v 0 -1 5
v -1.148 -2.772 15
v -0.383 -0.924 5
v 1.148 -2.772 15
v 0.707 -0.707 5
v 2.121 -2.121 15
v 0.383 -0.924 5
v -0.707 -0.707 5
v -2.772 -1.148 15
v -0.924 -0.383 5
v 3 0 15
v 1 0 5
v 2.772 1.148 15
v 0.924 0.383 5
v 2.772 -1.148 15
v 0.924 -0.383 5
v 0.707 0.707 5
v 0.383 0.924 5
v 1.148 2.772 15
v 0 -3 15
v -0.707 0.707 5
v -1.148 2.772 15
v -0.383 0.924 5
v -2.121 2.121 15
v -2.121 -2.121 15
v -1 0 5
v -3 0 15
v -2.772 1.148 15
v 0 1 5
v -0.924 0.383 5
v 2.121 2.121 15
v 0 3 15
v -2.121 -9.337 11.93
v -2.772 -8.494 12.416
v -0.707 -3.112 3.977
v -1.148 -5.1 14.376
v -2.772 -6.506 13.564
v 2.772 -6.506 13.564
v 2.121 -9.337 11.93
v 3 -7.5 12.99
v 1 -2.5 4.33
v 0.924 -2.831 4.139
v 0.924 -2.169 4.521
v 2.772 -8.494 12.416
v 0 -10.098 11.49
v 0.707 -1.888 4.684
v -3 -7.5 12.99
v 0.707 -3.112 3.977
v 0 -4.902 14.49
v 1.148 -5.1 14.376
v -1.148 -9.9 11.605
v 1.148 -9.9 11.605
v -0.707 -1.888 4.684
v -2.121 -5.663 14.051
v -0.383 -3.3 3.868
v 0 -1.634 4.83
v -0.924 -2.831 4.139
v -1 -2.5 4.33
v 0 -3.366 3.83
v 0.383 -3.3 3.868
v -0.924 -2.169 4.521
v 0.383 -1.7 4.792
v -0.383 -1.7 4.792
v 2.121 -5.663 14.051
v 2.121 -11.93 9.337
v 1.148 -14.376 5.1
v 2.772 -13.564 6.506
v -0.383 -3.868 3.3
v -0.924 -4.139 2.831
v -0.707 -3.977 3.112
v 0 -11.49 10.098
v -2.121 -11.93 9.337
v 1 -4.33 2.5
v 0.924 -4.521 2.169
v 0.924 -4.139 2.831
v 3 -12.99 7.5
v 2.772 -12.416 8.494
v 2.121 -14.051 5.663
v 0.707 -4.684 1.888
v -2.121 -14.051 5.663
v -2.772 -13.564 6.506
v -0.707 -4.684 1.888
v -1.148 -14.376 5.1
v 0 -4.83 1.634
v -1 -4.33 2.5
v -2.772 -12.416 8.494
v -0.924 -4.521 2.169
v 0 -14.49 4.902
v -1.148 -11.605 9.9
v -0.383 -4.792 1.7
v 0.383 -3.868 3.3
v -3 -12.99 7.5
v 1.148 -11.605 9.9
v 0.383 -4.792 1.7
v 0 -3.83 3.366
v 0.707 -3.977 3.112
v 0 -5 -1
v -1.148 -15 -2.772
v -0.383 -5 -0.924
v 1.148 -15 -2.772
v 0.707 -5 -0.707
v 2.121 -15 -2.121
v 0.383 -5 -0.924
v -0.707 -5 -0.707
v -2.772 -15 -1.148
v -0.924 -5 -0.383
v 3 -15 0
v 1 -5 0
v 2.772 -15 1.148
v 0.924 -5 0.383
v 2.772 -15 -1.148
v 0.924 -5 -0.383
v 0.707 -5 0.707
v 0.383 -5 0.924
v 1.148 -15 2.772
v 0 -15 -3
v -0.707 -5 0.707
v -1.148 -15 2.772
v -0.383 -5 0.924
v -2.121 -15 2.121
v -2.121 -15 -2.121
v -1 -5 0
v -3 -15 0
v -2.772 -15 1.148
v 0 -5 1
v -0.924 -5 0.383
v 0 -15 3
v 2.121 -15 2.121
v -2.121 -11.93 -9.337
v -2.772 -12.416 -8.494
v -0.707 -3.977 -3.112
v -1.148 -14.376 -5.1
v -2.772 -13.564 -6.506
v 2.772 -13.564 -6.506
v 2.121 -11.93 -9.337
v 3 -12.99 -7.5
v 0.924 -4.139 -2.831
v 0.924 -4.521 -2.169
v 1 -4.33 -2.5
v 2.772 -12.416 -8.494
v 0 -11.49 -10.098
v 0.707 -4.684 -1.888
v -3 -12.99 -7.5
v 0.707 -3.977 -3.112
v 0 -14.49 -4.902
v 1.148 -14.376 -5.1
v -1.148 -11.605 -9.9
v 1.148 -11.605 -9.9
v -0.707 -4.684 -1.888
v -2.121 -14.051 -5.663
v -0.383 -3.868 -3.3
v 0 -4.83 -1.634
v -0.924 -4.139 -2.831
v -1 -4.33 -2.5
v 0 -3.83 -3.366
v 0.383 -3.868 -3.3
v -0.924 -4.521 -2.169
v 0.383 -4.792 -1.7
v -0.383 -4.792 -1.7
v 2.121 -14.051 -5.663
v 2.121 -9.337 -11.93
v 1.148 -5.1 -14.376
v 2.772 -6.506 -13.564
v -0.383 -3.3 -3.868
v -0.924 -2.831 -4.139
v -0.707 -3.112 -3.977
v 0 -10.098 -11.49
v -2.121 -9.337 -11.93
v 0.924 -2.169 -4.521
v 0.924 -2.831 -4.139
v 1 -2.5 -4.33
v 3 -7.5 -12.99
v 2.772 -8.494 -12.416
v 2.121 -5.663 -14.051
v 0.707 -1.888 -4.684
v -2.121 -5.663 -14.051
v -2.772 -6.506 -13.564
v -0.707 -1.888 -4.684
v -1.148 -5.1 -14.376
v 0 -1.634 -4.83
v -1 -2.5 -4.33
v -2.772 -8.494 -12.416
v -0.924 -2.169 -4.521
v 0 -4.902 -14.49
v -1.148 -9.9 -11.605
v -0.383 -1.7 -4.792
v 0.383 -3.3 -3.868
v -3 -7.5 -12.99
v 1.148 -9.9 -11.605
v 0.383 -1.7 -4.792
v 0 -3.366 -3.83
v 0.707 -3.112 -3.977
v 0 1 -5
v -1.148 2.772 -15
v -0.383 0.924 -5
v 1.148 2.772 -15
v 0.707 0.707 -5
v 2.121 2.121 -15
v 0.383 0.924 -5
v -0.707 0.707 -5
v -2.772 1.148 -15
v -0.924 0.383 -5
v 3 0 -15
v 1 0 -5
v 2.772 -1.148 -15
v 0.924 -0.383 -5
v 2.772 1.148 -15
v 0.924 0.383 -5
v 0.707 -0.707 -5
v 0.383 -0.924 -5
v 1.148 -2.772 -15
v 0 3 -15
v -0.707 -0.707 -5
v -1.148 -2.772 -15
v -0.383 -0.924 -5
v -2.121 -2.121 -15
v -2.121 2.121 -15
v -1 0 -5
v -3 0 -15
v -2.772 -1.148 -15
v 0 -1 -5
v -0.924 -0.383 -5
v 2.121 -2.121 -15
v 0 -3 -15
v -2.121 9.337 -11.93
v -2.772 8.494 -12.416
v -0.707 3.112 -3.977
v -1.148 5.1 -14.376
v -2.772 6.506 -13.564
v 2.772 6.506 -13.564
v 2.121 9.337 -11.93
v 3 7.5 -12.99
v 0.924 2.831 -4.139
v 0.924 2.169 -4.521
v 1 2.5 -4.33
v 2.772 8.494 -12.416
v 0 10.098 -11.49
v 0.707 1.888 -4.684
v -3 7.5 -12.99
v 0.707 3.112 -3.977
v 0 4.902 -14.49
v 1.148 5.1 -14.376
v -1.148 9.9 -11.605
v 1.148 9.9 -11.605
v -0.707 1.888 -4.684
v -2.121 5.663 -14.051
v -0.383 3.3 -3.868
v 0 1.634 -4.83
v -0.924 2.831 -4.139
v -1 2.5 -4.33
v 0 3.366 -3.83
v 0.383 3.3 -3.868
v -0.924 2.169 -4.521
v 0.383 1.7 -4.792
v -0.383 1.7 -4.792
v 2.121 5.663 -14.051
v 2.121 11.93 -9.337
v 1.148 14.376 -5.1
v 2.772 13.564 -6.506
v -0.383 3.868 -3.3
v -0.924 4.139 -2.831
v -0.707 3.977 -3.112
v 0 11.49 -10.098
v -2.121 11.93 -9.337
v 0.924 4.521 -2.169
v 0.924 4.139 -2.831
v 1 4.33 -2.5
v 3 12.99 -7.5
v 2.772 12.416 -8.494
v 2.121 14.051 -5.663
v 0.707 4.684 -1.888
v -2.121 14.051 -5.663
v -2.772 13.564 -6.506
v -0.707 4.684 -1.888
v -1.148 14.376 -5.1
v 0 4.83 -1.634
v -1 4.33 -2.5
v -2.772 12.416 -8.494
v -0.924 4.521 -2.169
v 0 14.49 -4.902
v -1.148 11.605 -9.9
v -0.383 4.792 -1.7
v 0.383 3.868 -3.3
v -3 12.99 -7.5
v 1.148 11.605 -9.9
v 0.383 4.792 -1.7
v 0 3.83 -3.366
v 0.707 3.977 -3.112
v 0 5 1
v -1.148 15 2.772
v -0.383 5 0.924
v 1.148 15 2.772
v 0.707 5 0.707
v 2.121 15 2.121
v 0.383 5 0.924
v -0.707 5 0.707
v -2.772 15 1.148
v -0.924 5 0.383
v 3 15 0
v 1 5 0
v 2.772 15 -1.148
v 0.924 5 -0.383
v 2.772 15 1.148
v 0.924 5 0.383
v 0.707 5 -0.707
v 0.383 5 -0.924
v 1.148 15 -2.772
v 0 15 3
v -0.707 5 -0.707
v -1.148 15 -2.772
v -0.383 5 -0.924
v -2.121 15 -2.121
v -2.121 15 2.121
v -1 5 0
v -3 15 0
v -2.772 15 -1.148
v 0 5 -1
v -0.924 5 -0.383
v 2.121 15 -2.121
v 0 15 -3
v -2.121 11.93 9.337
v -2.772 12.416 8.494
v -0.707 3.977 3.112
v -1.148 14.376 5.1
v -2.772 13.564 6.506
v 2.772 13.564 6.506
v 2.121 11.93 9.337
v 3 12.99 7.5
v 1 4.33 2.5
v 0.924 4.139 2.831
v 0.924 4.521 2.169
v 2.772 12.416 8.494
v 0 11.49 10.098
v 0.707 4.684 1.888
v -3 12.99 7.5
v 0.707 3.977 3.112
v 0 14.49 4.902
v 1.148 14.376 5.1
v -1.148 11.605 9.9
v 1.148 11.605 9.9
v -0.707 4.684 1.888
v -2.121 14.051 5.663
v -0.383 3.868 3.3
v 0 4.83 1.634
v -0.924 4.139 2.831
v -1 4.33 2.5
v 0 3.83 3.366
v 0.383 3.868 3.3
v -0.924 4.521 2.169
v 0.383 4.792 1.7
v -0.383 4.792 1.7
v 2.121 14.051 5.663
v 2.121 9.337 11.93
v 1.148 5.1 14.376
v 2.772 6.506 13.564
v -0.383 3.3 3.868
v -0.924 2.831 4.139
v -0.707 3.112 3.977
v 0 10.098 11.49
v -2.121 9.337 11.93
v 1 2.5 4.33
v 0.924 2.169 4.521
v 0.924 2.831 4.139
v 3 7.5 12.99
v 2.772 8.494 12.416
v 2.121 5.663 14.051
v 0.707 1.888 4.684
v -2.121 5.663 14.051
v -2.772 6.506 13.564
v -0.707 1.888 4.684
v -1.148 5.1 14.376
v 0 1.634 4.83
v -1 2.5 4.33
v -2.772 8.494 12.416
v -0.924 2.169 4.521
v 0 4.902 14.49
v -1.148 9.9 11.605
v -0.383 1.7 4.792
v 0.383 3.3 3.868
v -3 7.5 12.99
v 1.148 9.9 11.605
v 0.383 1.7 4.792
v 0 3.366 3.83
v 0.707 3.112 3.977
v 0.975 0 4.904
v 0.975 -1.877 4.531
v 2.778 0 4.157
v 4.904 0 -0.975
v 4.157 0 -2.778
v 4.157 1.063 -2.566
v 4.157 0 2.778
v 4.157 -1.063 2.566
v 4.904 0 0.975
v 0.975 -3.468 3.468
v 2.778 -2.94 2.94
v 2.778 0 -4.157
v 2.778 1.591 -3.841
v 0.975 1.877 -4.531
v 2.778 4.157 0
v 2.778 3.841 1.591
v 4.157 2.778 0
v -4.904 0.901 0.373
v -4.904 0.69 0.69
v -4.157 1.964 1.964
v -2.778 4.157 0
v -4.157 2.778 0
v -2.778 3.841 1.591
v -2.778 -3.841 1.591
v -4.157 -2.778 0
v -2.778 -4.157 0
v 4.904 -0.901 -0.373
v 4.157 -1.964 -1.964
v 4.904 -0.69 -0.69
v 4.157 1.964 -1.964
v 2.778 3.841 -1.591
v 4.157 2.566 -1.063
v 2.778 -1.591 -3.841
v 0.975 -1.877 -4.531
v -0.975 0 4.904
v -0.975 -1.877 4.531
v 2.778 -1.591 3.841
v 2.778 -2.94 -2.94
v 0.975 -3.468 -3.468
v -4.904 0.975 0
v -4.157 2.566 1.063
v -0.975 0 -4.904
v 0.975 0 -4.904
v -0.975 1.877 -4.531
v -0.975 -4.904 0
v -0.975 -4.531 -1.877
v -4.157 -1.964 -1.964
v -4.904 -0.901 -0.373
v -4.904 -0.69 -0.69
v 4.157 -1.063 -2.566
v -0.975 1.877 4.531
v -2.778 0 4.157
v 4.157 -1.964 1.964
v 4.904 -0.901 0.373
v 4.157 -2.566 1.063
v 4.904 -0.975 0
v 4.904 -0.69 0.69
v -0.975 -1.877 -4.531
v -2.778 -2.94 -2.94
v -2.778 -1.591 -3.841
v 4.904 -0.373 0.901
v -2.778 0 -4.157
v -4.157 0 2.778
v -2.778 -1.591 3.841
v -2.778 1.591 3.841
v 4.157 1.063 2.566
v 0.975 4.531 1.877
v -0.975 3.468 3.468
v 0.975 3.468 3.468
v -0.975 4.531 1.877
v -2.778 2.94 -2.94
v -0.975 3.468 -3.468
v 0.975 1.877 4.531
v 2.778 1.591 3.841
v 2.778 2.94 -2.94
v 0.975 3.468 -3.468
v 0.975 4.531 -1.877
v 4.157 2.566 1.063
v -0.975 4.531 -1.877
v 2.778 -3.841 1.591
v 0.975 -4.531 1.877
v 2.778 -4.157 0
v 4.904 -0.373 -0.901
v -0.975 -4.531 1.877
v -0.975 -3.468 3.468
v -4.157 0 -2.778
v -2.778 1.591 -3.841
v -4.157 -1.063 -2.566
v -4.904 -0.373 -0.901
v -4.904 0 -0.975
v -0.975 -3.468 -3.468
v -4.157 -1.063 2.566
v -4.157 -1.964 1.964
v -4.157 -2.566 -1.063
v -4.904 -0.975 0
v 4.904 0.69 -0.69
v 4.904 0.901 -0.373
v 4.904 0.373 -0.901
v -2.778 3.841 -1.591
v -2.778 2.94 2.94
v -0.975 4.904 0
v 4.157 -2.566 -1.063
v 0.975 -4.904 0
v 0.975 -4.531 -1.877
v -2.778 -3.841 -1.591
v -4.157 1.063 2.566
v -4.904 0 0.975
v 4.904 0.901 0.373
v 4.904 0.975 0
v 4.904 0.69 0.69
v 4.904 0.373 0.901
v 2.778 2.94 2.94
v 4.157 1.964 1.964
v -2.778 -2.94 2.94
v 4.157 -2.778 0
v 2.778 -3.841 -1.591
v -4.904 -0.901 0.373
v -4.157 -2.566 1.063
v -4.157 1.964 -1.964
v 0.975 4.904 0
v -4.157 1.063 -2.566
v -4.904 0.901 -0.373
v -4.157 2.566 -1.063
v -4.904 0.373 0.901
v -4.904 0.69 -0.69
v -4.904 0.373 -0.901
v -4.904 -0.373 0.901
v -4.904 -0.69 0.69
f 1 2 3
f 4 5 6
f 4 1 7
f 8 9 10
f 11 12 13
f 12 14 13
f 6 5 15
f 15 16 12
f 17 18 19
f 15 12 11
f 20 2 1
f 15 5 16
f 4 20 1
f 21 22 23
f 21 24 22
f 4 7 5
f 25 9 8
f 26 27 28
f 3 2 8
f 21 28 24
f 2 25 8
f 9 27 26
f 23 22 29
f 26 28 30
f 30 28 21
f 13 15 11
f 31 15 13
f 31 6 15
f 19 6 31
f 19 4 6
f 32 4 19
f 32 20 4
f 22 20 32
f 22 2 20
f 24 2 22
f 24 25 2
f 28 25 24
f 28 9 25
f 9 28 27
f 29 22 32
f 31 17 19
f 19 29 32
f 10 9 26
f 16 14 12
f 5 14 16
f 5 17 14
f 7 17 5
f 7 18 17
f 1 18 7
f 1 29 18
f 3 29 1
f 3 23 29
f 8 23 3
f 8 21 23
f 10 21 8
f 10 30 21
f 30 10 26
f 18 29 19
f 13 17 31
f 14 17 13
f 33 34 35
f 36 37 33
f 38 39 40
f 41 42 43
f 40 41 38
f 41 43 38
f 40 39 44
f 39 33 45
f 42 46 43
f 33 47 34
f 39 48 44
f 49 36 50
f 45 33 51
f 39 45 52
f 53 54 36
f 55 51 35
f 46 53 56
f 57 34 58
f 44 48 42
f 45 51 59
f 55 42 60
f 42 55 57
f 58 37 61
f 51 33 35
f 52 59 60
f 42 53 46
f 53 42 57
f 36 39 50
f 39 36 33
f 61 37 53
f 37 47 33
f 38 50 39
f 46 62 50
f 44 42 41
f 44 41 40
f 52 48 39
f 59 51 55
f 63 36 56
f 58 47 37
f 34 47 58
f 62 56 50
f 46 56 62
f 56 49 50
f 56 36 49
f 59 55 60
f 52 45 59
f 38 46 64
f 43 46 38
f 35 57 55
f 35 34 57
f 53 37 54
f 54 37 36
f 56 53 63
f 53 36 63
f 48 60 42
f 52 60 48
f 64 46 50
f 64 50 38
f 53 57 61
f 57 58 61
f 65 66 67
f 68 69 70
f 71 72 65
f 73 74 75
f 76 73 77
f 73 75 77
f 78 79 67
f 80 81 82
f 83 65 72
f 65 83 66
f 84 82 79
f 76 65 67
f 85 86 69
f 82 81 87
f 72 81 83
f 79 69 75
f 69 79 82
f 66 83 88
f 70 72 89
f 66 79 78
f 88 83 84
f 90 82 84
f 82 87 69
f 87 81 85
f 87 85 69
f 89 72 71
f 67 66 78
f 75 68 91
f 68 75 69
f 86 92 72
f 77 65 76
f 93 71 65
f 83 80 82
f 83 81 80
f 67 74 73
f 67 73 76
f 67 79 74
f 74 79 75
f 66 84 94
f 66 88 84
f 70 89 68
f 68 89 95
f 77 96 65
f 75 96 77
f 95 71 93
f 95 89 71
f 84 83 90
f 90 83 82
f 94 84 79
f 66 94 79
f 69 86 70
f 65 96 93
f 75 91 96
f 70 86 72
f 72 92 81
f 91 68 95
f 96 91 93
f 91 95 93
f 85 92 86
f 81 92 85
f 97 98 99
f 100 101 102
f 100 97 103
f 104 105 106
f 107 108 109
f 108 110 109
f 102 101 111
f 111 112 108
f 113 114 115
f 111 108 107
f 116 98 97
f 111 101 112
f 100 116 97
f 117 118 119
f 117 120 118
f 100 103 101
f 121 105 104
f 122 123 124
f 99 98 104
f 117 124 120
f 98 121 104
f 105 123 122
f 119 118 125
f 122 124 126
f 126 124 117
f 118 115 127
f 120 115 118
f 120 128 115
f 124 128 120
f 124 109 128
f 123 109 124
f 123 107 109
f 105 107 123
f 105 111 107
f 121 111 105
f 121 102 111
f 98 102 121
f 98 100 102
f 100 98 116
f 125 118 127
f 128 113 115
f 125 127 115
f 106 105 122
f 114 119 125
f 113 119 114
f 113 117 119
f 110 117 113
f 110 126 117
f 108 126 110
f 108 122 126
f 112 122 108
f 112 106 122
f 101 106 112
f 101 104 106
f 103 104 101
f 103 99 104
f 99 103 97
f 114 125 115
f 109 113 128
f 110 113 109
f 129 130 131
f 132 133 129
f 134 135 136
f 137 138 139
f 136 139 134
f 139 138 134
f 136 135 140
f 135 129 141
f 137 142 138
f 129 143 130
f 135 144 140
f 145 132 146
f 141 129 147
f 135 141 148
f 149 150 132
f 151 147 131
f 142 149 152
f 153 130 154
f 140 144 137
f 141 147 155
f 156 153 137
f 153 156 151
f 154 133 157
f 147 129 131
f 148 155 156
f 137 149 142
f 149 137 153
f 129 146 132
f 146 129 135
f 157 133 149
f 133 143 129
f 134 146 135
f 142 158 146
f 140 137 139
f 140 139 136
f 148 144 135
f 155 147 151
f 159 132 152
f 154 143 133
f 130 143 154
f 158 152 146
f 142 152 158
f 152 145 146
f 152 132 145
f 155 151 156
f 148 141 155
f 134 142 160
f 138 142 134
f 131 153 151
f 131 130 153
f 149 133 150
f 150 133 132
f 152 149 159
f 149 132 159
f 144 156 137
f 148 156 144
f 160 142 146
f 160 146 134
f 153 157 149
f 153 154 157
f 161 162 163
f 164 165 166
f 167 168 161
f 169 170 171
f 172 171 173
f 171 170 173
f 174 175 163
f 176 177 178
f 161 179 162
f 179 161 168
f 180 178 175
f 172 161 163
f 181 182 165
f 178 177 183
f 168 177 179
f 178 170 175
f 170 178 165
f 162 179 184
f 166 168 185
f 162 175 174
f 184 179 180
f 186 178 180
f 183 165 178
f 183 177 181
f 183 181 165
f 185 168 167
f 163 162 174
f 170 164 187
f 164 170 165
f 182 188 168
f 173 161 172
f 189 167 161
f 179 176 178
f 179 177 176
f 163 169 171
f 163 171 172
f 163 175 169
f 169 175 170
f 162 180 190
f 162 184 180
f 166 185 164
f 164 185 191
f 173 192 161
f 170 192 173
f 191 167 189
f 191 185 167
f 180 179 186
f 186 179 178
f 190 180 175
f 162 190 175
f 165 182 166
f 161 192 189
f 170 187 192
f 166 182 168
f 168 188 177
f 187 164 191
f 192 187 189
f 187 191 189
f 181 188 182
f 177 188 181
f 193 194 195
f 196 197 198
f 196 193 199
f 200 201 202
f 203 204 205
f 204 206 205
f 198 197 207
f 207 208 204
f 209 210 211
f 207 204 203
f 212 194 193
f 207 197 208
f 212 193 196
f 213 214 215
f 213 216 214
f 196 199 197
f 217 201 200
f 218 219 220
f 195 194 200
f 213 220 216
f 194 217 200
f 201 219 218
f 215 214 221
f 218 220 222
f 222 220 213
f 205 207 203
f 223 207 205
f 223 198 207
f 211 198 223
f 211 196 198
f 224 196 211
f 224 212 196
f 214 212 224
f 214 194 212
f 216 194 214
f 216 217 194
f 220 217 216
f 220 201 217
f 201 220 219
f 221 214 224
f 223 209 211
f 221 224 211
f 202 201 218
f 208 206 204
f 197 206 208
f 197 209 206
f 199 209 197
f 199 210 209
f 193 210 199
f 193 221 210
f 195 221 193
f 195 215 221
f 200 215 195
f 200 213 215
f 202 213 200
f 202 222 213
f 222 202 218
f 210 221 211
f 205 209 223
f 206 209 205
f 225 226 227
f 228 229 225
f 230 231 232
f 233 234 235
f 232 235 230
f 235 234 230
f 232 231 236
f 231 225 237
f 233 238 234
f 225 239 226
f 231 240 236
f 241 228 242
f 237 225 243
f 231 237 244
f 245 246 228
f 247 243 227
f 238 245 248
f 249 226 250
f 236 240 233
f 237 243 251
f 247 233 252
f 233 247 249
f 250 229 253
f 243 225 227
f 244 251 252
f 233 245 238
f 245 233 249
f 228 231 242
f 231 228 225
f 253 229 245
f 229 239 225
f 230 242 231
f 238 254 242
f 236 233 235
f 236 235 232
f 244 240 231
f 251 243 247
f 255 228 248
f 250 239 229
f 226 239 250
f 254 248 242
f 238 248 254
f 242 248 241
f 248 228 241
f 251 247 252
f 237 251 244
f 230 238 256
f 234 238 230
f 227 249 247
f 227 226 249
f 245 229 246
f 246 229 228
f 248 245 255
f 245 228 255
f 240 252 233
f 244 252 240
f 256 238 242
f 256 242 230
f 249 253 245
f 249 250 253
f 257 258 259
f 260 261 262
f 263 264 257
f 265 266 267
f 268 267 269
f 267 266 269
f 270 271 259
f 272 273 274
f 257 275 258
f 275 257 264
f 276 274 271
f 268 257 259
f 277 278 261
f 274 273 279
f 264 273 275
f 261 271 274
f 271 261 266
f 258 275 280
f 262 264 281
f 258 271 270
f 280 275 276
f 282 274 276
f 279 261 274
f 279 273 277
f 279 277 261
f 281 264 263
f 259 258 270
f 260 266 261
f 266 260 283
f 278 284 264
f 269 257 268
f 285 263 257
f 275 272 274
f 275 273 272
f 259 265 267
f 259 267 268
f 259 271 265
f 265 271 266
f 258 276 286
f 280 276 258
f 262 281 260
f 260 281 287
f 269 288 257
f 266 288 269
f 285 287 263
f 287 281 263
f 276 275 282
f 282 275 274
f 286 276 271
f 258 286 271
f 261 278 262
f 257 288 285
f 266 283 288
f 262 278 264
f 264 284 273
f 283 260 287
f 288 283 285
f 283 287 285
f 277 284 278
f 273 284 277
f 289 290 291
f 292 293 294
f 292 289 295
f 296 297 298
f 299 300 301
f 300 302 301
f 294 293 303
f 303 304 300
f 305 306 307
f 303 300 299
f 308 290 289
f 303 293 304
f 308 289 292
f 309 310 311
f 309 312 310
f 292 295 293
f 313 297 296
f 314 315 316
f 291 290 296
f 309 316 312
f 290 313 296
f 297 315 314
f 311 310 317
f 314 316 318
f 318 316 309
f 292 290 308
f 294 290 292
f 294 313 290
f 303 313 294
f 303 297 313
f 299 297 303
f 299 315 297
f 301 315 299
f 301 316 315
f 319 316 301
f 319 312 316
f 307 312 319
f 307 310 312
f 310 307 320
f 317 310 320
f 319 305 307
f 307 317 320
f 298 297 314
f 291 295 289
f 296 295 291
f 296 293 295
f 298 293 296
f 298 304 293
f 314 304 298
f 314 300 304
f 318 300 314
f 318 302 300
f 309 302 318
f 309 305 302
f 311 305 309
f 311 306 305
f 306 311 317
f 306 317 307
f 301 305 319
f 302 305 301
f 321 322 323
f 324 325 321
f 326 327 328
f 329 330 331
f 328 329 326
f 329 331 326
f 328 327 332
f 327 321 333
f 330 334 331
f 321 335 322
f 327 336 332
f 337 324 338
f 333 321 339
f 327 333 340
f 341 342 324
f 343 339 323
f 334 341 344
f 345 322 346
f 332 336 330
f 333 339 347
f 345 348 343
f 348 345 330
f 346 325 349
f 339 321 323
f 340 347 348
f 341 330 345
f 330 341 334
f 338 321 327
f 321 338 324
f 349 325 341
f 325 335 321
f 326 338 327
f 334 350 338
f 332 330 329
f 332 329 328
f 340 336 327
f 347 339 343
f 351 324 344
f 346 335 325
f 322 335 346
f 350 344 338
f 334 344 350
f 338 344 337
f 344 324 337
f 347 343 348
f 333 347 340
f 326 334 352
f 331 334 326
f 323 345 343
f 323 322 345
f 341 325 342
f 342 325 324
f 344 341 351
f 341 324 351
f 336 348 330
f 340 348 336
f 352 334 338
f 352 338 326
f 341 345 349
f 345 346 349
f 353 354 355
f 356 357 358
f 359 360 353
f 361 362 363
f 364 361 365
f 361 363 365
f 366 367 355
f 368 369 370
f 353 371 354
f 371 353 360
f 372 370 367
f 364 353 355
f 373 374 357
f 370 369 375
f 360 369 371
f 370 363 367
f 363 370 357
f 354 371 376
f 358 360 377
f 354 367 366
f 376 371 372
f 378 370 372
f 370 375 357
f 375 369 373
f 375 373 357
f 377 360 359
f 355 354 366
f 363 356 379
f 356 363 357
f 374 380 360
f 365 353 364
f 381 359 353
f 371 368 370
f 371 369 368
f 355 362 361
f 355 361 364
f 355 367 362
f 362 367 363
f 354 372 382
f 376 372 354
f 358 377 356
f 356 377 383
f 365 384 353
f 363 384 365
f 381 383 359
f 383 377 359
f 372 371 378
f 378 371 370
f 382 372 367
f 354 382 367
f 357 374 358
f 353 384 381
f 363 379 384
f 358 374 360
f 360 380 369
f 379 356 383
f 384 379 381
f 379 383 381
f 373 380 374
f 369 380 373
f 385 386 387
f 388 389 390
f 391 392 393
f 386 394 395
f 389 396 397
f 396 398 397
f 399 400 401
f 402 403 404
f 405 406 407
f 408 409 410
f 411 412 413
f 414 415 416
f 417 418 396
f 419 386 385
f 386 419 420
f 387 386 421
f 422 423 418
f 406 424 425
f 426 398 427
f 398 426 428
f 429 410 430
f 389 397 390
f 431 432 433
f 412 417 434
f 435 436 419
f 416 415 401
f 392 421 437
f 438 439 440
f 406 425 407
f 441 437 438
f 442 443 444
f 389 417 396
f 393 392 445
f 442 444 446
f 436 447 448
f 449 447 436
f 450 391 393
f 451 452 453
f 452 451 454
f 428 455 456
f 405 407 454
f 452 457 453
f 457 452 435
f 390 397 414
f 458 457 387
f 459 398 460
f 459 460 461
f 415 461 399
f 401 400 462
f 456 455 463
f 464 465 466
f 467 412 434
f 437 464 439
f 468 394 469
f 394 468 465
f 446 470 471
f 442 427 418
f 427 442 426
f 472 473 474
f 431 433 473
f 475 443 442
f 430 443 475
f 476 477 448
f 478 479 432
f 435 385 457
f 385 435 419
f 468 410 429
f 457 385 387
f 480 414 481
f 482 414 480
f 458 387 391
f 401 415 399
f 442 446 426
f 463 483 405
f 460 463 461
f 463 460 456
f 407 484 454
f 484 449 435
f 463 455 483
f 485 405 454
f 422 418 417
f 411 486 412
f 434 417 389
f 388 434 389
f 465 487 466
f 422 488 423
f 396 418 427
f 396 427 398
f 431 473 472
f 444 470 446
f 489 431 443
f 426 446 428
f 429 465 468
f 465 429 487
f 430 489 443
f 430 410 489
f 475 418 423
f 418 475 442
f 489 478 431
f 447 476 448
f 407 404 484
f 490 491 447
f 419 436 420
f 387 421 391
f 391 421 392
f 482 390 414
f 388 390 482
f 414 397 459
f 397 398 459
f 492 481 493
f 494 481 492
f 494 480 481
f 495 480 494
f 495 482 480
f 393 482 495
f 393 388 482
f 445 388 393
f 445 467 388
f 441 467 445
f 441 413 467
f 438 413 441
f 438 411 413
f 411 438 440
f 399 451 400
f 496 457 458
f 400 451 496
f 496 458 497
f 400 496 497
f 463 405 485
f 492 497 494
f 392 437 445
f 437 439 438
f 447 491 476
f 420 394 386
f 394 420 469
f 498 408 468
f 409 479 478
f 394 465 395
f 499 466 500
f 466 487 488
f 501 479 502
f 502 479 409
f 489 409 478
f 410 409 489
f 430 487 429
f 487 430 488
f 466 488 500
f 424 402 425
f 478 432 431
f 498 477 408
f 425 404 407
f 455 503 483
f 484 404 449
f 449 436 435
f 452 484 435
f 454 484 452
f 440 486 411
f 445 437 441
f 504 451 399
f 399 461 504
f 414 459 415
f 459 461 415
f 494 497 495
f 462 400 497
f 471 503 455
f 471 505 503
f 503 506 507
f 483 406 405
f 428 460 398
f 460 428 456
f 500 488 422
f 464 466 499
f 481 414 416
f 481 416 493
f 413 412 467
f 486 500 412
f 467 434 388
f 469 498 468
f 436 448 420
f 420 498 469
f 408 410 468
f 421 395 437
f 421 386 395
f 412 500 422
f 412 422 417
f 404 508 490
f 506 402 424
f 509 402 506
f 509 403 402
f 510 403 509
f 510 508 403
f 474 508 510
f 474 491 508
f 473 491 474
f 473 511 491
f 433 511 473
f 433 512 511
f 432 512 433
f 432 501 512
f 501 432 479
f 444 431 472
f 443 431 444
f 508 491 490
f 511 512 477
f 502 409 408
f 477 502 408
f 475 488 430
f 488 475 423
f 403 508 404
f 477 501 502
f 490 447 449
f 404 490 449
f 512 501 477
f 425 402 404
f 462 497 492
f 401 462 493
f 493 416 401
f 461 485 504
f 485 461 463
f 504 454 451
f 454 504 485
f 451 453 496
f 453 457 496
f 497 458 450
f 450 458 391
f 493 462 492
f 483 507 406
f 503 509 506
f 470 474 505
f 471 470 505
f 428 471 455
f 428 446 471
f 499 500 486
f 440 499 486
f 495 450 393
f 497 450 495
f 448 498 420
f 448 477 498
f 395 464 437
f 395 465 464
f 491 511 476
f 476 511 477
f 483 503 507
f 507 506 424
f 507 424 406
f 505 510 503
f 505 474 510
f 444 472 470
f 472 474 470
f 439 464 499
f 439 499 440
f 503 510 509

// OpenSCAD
$fn = 32; 

color("#AA5566")

rotate(a=90, v=[0,1,0]) 

sphere(5); 

$fn = 16; 

for (i = [0:30:330]){ 
	bob =  str("#55",str(i%101),str(i%101));
	echo(bob);
	color(bob)

	rotate(a=i,v=[1,0,0]) 
	translate([0,0,5]) 
	cylinder(h=10, r1=1, r2 = 3); 

} 
